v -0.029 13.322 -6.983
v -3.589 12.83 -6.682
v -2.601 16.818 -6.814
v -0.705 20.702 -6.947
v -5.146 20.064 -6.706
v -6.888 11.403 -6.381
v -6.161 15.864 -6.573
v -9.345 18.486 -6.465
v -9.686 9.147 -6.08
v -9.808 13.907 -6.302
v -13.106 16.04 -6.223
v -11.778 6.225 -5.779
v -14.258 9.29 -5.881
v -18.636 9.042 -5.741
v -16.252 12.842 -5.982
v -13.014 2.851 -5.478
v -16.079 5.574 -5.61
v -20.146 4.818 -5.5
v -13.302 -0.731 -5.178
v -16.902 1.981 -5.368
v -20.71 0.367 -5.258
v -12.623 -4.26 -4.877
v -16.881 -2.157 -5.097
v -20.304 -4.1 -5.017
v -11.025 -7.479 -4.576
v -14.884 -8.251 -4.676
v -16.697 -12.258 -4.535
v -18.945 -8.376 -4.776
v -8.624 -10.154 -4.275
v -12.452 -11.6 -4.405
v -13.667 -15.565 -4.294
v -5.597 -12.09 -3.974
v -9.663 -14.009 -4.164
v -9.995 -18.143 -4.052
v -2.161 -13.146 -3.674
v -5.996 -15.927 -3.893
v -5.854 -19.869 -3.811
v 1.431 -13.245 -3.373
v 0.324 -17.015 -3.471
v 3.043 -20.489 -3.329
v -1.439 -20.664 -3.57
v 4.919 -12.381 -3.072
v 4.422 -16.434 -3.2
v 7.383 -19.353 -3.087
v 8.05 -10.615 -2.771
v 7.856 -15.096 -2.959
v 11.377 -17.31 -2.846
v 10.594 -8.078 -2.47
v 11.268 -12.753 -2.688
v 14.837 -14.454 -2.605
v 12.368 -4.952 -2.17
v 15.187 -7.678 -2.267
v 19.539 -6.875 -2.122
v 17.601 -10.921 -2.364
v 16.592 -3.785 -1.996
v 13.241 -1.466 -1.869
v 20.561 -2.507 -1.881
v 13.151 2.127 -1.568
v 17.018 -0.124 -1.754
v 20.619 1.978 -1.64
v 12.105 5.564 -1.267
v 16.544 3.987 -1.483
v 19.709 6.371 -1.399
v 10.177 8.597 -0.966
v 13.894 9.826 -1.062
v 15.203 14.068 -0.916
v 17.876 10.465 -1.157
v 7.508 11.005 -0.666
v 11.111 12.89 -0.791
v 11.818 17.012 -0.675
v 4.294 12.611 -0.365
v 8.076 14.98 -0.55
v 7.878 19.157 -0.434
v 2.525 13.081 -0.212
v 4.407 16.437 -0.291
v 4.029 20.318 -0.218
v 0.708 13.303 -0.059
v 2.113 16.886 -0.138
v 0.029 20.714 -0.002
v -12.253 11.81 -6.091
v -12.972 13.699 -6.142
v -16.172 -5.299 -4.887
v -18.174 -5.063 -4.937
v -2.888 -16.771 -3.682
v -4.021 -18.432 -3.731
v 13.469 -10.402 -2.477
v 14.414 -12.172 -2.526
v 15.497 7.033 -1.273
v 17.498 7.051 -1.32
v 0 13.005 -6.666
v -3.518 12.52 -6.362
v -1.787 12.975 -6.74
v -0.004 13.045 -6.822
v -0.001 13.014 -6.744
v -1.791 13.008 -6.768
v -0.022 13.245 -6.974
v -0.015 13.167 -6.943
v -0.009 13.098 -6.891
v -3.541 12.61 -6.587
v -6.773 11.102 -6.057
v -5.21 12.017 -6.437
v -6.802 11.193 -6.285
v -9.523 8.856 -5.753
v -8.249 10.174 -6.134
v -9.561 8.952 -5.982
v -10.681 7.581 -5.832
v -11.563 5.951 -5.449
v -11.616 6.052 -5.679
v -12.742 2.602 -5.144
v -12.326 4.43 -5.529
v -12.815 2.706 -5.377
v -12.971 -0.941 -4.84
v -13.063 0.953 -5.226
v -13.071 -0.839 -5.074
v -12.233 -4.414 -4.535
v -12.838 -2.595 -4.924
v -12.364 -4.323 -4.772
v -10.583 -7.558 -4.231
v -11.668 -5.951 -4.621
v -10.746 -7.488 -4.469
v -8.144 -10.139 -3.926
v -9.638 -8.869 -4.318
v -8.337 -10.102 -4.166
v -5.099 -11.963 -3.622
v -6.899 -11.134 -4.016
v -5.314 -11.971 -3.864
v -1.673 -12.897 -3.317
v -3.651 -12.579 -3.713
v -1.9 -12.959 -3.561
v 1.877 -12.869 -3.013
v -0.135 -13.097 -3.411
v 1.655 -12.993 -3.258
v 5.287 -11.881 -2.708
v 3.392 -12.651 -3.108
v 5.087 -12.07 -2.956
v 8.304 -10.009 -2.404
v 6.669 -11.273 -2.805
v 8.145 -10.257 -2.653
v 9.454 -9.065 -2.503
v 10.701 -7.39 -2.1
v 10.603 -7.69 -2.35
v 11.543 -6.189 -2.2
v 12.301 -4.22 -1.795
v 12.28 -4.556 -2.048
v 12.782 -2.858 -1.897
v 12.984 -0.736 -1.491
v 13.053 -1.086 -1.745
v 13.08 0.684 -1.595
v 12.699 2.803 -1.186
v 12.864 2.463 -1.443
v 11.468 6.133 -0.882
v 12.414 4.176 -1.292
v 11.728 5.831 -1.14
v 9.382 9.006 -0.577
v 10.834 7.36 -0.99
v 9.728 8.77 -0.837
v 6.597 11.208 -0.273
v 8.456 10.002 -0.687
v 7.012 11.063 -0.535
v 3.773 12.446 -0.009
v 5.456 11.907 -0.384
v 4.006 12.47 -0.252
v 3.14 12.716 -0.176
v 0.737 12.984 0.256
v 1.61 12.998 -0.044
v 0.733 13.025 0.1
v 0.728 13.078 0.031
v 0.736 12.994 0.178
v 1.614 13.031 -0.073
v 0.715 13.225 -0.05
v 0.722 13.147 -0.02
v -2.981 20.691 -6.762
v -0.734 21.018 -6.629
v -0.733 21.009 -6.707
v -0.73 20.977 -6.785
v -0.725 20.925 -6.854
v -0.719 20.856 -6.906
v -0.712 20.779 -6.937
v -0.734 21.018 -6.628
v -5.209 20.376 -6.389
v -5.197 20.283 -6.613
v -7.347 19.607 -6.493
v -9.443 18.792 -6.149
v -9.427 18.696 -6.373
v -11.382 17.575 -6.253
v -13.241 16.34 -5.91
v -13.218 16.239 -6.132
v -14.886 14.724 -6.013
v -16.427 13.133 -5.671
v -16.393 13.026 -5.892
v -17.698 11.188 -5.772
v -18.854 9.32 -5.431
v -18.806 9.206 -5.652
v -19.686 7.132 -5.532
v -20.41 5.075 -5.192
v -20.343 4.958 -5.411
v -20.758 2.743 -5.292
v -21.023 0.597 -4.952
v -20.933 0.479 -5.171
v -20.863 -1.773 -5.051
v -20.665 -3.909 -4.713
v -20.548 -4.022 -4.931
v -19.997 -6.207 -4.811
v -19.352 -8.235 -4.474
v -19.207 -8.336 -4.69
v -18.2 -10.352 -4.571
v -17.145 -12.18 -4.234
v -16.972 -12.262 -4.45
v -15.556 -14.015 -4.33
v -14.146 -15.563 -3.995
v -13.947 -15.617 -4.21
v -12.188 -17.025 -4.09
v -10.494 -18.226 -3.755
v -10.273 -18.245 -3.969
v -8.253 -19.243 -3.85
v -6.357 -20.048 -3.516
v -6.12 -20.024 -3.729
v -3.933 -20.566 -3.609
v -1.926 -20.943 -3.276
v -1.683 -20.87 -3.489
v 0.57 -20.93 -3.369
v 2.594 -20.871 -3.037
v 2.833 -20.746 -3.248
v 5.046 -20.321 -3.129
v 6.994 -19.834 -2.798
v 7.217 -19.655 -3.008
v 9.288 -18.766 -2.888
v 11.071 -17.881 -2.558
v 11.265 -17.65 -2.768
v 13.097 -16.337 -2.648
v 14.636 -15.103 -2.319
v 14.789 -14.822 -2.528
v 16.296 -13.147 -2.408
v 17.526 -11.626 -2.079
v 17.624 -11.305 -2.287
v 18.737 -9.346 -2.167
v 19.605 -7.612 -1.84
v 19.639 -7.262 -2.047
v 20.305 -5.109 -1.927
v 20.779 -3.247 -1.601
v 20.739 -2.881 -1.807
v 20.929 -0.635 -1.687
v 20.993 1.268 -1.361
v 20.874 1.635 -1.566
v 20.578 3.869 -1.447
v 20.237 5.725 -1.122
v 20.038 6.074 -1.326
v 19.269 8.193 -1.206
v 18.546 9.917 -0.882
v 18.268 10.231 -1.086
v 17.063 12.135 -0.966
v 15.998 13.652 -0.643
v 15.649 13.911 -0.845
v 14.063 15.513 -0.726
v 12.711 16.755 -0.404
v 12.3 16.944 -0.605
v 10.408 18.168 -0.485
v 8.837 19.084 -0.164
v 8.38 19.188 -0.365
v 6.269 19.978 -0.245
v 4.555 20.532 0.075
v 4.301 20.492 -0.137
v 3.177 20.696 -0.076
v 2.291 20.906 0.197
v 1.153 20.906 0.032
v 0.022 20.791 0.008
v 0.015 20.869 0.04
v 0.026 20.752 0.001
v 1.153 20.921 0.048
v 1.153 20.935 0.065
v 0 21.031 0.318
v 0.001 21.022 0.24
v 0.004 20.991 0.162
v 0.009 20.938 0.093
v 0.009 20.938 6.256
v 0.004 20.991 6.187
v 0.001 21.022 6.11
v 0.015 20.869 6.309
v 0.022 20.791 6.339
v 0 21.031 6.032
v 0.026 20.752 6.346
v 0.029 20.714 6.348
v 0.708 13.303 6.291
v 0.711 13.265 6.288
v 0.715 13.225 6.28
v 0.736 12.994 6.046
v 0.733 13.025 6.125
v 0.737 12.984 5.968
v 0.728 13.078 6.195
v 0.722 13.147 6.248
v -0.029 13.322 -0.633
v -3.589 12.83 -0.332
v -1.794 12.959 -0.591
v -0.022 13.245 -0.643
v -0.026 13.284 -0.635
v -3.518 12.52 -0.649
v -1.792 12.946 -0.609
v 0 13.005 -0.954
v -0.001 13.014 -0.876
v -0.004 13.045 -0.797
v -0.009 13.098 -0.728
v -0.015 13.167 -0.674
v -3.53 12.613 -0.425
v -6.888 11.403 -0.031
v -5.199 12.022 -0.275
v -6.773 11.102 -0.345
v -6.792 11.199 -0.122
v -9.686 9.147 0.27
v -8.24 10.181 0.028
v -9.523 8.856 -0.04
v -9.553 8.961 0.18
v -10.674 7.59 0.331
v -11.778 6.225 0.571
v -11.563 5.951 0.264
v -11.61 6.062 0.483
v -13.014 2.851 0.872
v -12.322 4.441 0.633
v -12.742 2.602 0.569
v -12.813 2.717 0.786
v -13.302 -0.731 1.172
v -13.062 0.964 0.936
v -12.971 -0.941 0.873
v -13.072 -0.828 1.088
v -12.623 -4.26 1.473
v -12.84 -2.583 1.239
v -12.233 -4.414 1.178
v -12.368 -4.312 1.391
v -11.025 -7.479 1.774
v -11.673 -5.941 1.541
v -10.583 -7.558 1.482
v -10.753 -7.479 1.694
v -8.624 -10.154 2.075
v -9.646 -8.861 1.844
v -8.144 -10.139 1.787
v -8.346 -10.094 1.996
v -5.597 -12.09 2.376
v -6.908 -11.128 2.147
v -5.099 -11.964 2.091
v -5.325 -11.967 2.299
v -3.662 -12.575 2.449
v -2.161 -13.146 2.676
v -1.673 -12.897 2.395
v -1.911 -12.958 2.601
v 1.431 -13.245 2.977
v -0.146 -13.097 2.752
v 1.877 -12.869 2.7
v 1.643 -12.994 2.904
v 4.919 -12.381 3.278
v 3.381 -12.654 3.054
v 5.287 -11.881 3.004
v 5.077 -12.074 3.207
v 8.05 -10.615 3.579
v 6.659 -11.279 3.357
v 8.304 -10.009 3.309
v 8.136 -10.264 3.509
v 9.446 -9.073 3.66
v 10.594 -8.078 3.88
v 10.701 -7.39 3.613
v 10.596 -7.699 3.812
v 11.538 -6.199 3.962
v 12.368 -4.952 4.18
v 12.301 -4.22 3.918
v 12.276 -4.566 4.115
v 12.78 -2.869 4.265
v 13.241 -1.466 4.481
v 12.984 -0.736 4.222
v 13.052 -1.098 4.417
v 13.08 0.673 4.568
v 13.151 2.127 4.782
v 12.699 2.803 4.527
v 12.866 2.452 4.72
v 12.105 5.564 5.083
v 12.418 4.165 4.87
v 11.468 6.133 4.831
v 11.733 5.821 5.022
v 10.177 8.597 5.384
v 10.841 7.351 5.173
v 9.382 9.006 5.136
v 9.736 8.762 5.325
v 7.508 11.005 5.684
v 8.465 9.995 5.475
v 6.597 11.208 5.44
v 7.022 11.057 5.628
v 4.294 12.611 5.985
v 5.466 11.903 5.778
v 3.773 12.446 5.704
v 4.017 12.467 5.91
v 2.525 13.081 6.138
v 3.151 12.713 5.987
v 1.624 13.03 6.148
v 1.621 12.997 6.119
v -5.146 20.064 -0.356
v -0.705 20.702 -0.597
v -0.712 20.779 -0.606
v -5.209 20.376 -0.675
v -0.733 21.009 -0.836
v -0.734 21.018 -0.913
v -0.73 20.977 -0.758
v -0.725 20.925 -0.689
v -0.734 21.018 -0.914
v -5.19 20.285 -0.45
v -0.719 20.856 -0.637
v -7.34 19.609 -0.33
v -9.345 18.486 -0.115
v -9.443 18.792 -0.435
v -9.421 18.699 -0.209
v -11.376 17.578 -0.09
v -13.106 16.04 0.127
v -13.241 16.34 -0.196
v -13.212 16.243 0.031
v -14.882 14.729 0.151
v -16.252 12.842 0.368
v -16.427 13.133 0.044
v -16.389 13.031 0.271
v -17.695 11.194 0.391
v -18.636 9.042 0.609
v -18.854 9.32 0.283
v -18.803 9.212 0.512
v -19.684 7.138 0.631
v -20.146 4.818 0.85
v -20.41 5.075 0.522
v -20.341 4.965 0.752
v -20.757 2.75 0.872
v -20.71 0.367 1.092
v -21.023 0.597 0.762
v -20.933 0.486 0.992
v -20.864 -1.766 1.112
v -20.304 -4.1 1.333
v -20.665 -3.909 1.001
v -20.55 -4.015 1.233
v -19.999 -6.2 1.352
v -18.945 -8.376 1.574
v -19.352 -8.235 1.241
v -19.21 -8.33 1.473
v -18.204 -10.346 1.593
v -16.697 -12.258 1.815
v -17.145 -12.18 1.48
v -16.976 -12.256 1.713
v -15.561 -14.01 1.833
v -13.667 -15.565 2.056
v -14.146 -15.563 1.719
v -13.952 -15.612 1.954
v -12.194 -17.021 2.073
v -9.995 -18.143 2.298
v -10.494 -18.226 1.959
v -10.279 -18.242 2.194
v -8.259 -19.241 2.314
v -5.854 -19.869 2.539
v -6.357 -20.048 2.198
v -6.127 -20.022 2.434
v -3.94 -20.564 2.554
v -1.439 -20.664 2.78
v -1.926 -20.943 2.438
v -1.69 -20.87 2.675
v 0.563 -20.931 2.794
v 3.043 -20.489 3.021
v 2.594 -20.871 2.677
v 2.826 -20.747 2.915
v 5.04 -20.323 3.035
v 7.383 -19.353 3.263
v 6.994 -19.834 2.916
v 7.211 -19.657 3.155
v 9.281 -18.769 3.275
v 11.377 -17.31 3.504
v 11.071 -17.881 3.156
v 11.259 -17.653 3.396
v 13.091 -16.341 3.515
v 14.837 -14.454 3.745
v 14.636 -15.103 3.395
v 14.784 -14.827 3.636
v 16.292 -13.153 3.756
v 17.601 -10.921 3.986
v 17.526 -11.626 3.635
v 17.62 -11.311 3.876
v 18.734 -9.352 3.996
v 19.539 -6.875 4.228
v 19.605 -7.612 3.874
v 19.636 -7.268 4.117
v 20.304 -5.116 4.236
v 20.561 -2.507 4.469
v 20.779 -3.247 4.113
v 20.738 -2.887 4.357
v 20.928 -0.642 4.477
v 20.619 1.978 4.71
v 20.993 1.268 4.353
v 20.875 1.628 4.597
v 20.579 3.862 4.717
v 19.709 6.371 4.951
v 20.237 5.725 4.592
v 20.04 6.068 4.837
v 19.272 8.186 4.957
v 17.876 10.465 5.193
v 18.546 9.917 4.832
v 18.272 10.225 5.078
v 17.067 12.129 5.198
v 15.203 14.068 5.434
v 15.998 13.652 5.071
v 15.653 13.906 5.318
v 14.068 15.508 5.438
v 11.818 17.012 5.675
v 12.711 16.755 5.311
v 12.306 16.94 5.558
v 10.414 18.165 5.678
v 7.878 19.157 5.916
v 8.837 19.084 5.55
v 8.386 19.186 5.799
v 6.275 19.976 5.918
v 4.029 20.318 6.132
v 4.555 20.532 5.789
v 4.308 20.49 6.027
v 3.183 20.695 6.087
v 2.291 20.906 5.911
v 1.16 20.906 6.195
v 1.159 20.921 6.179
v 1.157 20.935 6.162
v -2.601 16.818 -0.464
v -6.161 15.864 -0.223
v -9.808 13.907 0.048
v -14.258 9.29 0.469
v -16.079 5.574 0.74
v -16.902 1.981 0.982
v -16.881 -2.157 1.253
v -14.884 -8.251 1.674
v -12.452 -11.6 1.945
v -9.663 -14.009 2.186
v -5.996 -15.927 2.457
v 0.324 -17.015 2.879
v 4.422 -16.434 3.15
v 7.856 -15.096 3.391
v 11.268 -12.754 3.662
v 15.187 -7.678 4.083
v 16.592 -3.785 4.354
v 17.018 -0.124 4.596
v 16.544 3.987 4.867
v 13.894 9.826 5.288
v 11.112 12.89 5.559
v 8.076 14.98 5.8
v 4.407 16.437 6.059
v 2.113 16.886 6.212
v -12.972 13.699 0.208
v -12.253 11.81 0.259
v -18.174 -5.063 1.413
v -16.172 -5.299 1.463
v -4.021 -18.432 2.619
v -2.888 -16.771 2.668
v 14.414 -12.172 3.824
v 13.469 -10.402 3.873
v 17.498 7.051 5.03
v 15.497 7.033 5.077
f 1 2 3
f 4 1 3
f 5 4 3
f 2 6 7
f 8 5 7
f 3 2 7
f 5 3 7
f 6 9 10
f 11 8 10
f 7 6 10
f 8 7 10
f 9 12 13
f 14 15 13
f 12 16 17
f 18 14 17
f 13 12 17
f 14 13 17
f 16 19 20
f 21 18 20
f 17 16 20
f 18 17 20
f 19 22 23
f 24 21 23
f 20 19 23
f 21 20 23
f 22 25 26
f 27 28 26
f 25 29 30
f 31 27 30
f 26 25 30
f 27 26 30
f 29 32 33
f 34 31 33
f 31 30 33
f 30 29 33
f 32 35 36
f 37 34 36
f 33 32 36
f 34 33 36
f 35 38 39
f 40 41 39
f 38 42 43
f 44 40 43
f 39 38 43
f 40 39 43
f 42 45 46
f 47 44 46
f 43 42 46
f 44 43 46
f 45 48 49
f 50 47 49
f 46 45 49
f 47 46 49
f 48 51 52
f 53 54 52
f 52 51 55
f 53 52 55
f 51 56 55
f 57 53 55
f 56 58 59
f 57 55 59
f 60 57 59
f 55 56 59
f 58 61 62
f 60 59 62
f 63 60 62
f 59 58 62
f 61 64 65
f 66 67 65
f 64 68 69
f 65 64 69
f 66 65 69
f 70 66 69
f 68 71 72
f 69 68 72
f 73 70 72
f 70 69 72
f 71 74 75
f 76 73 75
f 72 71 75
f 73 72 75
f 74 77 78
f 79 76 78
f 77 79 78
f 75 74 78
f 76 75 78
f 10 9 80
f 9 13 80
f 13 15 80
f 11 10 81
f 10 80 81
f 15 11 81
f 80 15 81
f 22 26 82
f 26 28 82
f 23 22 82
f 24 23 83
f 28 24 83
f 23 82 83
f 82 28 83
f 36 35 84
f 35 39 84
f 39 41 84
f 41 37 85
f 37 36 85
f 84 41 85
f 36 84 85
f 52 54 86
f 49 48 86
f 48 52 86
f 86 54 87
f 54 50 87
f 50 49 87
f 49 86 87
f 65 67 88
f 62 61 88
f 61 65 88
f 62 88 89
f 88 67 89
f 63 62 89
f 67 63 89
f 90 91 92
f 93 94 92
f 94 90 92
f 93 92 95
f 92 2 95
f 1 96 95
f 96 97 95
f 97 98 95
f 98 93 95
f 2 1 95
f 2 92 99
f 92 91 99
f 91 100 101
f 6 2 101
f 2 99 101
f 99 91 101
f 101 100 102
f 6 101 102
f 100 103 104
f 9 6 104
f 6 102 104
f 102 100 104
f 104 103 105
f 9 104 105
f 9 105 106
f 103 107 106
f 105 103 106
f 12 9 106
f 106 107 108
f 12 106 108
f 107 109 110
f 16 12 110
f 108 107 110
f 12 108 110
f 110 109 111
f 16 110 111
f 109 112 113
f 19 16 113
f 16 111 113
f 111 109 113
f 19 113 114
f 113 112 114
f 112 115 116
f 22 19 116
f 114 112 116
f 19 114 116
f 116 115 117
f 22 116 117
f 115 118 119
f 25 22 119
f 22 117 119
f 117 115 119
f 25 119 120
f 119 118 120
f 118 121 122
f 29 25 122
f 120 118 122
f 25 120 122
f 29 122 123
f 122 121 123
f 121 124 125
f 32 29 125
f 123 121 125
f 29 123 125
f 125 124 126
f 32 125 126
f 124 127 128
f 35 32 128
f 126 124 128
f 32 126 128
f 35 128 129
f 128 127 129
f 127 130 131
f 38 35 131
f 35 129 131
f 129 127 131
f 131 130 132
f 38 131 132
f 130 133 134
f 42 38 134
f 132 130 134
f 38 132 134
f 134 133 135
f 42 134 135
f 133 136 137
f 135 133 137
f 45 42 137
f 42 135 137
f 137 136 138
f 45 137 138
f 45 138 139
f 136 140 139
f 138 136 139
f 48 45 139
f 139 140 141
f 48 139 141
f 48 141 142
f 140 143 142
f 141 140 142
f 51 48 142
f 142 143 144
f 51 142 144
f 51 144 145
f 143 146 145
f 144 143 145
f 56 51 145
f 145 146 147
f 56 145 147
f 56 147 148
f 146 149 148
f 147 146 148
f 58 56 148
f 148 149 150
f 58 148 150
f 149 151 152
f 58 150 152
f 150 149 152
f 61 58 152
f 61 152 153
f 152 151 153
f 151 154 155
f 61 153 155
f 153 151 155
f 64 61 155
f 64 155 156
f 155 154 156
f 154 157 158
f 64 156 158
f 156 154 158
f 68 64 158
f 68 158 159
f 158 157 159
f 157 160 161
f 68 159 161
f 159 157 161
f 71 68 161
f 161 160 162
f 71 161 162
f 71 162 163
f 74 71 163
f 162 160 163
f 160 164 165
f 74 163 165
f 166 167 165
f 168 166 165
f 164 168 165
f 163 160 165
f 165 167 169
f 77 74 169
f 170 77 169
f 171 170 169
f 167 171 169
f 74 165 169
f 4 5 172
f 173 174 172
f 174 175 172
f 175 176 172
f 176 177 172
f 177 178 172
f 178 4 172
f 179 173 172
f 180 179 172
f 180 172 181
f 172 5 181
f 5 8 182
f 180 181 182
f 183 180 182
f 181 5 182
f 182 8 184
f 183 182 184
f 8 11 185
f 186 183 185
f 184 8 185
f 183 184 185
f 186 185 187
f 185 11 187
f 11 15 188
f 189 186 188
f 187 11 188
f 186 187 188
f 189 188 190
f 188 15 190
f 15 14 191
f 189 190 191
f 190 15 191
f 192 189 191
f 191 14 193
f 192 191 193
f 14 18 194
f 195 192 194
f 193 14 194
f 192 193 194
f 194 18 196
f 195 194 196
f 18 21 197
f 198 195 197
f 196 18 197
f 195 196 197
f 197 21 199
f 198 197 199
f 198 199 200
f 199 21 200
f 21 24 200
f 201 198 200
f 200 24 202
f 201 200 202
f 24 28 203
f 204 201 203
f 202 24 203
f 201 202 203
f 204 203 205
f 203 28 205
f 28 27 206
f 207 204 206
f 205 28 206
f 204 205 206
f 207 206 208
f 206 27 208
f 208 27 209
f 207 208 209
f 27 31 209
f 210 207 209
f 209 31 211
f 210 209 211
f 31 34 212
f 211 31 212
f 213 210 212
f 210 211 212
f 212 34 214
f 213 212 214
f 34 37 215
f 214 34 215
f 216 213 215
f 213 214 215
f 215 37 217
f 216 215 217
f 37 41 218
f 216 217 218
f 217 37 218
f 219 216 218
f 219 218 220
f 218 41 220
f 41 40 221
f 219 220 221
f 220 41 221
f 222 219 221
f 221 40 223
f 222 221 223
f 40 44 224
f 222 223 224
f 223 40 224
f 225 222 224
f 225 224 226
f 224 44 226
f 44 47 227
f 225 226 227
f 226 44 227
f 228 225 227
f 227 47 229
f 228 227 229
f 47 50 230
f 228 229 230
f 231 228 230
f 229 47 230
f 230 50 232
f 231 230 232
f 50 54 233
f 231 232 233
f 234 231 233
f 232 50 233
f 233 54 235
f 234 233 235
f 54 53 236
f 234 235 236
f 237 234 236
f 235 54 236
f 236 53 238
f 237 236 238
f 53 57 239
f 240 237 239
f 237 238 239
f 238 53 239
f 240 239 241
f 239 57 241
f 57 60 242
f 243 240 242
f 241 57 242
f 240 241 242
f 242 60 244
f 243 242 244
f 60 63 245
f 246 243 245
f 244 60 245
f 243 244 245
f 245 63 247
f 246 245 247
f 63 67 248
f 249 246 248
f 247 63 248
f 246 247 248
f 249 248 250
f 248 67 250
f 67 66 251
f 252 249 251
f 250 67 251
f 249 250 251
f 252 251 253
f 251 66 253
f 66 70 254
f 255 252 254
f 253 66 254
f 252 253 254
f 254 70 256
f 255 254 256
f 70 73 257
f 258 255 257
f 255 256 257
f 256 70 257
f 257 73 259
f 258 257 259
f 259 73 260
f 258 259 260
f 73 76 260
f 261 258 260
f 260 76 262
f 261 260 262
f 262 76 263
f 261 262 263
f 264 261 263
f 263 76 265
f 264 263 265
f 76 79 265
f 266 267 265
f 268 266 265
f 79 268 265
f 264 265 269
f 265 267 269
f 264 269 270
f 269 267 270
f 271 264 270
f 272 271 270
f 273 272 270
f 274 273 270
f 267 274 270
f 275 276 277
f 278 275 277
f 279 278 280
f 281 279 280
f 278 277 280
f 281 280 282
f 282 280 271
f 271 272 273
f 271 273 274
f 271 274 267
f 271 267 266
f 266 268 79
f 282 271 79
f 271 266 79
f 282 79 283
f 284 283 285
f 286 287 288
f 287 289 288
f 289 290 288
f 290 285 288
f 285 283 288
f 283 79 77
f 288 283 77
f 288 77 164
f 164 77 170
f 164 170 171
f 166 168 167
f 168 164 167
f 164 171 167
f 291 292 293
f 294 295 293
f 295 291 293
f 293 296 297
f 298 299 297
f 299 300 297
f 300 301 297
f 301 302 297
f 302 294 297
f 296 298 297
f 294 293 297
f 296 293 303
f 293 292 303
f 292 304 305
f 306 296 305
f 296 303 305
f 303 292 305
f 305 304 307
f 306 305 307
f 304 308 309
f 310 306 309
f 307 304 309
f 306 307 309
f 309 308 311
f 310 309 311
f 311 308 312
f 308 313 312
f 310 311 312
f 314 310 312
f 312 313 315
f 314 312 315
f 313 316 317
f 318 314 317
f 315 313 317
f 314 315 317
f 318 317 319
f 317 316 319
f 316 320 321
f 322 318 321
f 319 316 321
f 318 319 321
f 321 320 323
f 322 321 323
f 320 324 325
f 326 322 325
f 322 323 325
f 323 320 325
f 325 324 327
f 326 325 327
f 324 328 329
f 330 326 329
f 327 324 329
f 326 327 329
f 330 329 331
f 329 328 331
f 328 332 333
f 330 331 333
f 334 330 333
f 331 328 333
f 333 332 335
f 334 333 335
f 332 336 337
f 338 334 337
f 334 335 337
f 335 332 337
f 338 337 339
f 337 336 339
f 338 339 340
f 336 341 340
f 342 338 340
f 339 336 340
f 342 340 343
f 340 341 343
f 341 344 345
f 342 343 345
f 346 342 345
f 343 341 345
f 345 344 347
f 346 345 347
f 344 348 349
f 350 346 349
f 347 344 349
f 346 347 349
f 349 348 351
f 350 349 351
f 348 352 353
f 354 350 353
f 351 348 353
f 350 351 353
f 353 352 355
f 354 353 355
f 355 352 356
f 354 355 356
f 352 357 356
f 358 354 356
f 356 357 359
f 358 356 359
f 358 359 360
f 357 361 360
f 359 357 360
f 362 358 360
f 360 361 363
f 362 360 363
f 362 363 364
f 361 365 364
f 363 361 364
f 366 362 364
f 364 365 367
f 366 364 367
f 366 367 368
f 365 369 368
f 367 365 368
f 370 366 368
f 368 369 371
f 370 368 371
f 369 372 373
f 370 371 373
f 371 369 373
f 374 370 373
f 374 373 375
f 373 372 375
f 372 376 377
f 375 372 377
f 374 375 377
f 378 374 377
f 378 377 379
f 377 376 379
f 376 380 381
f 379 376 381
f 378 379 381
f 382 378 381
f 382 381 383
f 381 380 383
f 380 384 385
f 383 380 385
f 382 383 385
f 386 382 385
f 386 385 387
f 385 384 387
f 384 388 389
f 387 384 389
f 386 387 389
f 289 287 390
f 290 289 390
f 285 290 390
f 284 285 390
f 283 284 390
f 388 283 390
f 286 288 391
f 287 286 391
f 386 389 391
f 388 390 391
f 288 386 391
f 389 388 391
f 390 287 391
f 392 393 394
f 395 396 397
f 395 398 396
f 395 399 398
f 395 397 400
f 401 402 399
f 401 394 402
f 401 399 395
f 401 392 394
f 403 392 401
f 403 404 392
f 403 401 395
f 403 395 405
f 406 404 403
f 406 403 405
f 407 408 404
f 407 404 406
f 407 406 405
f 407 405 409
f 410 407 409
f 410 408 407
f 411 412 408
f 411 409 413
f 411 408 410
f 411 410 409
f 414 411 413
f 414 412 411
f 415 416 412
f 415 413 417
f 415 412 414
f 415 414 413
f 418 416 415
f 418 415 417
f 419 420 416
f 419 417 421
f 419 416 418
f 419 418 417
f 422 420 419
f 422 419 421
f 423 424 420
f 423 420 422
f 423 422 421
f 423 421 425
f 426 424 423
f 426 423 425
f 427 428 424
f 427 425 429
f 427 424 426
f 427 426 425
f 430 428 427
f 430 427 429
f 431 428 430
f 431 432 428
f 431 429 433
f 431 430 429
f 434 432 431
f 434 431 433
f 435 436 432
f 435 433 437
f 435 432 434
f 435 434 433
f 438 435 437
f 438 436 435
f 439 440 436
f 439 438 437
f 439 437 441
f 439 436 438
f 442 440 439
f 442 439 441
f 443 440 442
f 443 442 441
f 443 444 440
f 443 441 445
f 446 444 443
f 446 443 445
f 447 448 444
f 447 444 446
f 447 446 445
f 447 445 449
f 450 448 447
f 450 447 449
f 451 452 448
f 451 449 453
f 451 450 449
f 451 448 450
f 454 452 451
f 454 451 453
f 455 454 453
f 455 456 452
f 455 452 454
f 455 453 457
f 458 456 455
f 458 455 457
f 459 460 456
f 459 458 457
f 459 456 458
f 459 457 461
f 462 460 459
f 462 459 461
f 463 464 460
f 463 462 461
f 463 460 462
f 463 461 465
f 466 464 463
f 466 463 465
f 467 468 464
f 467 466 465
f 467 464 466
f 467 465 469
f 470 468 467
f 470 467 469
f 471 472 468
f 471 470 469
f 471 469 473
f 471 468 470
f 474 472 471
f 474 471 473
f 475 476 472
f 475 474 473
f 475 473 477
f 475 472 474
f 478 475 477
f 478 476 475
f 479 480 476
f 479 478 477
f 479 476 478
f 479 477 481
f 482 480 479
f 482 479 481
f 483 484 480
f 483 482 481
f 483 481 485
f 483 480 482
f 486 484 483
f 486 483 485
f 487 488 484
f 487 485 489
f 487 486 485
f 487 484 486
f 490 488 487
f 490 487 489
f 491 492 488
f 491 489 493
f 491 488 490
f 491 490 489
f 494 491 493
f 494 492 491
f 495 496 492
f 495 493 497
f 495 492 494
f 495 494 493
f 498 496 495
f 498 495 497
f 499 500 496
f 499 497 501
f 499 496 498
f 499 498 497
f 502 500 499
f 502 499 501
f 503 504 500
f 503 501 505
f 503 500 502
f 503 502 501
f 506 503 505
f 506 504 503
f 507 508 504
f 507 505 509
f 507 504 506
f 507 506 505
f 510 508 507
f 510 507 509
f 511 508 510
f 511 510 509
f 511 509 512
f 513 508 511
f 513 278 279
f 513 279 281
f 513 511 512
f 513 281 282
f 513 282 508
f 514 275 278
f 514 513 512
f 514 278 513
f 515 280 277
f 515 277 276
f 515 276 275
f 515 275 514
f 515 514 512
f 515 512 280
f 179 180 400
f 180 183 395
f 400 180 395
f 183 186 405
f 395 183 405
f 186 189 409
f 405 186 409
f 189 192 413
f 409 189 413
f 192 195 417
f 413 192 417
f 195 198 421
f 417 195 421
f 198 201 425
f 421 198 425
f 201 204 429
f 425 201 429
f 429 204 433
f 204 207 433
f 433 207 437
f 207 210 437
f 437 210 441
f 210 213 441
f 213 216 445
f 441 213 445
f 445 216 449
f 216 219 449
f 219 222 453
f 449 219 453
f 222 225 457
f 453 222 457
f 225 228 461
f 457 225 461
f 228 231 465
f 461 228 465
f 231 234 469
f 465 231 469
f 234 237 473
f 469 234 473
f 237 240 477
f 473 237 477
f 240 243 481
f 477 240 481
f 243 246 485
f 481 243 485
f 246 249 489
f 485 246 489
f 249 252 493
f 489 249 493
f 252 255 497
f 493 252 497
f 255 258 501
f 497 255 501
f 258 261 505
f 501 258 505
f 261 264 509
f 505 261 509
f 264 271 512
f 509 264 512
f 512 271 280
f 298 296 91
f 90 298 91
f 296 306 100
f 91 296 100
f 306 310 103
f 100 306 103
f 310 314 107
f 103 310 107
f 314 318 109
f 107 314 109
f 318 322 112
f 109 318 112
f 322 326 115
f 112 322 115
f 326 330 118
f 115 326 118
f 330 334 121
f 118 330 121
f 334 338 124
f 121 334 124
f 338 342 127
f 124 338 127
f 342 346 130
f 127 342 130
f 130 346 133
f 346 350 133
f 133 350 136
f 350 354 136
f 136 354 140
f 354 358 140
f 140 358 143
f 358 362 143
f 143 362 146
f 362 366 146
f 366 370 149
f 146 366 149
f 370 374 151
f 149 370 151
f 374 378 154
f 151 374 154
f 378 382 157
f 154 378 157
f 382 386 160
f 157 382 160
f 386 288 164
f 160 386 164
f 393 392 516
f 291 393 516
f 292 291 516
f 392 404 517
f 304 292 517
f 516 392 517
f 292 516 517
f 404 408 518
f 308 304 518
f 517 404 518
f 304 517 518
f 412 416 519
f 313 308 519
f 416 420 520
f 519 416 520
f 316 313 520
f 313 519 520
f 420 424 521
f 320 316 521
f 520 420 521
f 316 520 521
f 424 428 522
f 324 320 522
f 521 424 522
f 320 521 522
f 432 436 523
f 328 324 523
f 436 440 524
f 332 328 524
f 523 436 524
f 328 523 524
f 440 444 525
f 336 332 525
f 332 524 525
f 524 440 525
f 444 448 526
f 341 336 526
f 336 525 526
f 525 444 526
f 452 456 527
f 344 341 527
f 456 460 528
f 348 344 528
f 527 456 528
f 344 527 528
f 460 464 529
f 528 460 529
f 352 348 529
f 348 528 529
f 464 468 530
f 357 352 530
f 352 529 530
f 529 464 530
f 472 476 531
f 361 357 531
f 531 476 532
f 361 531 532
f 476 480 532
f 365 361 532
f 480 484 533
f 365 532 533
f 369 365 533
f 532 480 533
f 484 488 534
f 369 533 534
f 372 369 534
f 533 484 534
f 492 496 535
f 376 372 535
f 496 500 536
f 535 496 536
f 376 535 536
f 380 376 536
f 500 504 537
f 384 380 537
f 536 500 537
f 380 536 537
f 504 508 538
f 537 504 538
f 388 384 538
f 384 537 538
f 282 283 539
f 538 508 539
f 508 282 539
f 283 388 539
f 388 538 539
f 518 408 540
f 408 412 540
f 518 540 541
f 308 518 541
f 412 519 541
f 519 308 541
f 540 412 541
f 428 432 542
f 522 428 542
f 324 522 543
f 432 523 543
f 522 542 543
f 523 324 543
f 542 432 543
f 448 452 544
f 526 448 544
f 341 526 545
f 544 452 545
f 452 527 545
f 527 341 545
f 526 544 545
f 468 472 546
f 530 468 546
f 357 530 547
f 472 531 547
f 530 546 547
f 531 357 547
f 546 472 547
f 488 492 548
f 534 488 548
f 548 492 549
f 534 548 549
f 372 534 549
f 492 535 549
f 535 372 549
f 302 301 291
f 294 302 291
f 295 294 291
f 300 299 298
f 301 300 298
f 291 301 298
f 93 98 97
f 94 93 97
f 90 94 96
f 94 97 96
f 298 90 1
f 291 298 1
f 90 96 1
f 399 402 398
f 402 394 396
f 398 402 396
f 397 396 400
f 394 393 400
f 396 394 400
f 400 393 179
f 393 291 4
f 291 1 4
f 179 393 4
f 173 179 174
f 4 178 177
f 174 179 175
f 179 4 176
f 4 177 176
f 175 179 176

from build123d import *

# Parameters (mm, degrees)
SWEEP1_PITCH            = 6.985
SWEEP1_HEIGHT           = 6.985
SWEEP1_RADIUS           = 21.0312
SWEEP1_START_ANGLE      = 90
SKETCH4_W               = 6.35
SKETCH4_H               = 8.0264
FILLET1_R               = 0.3175
CUT_EXTRUDE1_DEPTH      = 31.551807358
CUT_EXTRUDE1_DEPTH_BACK = 31.551807358


with BuildPart() as part:
    # Sweep1: sweep along a helix
    with BuildLine() as sweep1_path:
        add(Helix(SWEEP1_PITCH, SWEEP1_HEIGHT, SWEEP1_RADIUS, center=(0, 0, -6.985), direction=(0, 0, 1), mode=Mode.PRIVATE).rotate(Axis((0, 0, -6.985), (0, 0, 1)), SWEEP1_START_ANGLE))
    # Sketch4 → Sweep1 (sweep)
    with BuildSketch(Plane(origin=(0, 0, 0), x_dir=(0, 0, -1), z_dir=(1, 0, 0))):
        with Locations((3.81, 17.018)):
            Rectangle(SKETCH4_W, SKETCH4_H)
    sweep(path=sweep1_path.line, is_frenet=True)

    # Fillet1
    fillet1_edges = [part.edges().sort_by_distance(p)[0] for p in [
        (0, -21.031177359, 2.8575),
        (0, -13.004786, 2.857500001),
        (0, -13.004785999, -3.492499999),
        (0, -21.031177358, -3.4925),
    ]]
    fillet(fillet1_edges, radius=FILLET1_R)

    # Sketch5 → Cut-Extrude1 (cut, two sides: drawn at the far end of the back side and taken through both)
    with BuildSketch(Plane.XY.offset(-CUT_EXTRUDE1_DEPTH_BACK)):
        with BuildLine():
            Line((0, 21.0312), (0.737066365, 12.983896034))
            Line((0.737066365, 12.983896034), (0.737066365, 0))
            Line((0.737066365, 0), (0, 0))
            Line((0, 0), (0, 13.0048))
            Line((0, 13.0048), (-0.733978295, 21.018388361))
            ThreePointArc((-0.733978295, 21.018388361), (-0.36704505, 21.027996846), (0, 21.0312))
        make_face()
    extrude(amount=CUT_EXTRUDE1_DEPTH + CUT_EXTRUDE1_DEPTH_BACK, mode=Mode.SUBTRACT)


solid = part.part
